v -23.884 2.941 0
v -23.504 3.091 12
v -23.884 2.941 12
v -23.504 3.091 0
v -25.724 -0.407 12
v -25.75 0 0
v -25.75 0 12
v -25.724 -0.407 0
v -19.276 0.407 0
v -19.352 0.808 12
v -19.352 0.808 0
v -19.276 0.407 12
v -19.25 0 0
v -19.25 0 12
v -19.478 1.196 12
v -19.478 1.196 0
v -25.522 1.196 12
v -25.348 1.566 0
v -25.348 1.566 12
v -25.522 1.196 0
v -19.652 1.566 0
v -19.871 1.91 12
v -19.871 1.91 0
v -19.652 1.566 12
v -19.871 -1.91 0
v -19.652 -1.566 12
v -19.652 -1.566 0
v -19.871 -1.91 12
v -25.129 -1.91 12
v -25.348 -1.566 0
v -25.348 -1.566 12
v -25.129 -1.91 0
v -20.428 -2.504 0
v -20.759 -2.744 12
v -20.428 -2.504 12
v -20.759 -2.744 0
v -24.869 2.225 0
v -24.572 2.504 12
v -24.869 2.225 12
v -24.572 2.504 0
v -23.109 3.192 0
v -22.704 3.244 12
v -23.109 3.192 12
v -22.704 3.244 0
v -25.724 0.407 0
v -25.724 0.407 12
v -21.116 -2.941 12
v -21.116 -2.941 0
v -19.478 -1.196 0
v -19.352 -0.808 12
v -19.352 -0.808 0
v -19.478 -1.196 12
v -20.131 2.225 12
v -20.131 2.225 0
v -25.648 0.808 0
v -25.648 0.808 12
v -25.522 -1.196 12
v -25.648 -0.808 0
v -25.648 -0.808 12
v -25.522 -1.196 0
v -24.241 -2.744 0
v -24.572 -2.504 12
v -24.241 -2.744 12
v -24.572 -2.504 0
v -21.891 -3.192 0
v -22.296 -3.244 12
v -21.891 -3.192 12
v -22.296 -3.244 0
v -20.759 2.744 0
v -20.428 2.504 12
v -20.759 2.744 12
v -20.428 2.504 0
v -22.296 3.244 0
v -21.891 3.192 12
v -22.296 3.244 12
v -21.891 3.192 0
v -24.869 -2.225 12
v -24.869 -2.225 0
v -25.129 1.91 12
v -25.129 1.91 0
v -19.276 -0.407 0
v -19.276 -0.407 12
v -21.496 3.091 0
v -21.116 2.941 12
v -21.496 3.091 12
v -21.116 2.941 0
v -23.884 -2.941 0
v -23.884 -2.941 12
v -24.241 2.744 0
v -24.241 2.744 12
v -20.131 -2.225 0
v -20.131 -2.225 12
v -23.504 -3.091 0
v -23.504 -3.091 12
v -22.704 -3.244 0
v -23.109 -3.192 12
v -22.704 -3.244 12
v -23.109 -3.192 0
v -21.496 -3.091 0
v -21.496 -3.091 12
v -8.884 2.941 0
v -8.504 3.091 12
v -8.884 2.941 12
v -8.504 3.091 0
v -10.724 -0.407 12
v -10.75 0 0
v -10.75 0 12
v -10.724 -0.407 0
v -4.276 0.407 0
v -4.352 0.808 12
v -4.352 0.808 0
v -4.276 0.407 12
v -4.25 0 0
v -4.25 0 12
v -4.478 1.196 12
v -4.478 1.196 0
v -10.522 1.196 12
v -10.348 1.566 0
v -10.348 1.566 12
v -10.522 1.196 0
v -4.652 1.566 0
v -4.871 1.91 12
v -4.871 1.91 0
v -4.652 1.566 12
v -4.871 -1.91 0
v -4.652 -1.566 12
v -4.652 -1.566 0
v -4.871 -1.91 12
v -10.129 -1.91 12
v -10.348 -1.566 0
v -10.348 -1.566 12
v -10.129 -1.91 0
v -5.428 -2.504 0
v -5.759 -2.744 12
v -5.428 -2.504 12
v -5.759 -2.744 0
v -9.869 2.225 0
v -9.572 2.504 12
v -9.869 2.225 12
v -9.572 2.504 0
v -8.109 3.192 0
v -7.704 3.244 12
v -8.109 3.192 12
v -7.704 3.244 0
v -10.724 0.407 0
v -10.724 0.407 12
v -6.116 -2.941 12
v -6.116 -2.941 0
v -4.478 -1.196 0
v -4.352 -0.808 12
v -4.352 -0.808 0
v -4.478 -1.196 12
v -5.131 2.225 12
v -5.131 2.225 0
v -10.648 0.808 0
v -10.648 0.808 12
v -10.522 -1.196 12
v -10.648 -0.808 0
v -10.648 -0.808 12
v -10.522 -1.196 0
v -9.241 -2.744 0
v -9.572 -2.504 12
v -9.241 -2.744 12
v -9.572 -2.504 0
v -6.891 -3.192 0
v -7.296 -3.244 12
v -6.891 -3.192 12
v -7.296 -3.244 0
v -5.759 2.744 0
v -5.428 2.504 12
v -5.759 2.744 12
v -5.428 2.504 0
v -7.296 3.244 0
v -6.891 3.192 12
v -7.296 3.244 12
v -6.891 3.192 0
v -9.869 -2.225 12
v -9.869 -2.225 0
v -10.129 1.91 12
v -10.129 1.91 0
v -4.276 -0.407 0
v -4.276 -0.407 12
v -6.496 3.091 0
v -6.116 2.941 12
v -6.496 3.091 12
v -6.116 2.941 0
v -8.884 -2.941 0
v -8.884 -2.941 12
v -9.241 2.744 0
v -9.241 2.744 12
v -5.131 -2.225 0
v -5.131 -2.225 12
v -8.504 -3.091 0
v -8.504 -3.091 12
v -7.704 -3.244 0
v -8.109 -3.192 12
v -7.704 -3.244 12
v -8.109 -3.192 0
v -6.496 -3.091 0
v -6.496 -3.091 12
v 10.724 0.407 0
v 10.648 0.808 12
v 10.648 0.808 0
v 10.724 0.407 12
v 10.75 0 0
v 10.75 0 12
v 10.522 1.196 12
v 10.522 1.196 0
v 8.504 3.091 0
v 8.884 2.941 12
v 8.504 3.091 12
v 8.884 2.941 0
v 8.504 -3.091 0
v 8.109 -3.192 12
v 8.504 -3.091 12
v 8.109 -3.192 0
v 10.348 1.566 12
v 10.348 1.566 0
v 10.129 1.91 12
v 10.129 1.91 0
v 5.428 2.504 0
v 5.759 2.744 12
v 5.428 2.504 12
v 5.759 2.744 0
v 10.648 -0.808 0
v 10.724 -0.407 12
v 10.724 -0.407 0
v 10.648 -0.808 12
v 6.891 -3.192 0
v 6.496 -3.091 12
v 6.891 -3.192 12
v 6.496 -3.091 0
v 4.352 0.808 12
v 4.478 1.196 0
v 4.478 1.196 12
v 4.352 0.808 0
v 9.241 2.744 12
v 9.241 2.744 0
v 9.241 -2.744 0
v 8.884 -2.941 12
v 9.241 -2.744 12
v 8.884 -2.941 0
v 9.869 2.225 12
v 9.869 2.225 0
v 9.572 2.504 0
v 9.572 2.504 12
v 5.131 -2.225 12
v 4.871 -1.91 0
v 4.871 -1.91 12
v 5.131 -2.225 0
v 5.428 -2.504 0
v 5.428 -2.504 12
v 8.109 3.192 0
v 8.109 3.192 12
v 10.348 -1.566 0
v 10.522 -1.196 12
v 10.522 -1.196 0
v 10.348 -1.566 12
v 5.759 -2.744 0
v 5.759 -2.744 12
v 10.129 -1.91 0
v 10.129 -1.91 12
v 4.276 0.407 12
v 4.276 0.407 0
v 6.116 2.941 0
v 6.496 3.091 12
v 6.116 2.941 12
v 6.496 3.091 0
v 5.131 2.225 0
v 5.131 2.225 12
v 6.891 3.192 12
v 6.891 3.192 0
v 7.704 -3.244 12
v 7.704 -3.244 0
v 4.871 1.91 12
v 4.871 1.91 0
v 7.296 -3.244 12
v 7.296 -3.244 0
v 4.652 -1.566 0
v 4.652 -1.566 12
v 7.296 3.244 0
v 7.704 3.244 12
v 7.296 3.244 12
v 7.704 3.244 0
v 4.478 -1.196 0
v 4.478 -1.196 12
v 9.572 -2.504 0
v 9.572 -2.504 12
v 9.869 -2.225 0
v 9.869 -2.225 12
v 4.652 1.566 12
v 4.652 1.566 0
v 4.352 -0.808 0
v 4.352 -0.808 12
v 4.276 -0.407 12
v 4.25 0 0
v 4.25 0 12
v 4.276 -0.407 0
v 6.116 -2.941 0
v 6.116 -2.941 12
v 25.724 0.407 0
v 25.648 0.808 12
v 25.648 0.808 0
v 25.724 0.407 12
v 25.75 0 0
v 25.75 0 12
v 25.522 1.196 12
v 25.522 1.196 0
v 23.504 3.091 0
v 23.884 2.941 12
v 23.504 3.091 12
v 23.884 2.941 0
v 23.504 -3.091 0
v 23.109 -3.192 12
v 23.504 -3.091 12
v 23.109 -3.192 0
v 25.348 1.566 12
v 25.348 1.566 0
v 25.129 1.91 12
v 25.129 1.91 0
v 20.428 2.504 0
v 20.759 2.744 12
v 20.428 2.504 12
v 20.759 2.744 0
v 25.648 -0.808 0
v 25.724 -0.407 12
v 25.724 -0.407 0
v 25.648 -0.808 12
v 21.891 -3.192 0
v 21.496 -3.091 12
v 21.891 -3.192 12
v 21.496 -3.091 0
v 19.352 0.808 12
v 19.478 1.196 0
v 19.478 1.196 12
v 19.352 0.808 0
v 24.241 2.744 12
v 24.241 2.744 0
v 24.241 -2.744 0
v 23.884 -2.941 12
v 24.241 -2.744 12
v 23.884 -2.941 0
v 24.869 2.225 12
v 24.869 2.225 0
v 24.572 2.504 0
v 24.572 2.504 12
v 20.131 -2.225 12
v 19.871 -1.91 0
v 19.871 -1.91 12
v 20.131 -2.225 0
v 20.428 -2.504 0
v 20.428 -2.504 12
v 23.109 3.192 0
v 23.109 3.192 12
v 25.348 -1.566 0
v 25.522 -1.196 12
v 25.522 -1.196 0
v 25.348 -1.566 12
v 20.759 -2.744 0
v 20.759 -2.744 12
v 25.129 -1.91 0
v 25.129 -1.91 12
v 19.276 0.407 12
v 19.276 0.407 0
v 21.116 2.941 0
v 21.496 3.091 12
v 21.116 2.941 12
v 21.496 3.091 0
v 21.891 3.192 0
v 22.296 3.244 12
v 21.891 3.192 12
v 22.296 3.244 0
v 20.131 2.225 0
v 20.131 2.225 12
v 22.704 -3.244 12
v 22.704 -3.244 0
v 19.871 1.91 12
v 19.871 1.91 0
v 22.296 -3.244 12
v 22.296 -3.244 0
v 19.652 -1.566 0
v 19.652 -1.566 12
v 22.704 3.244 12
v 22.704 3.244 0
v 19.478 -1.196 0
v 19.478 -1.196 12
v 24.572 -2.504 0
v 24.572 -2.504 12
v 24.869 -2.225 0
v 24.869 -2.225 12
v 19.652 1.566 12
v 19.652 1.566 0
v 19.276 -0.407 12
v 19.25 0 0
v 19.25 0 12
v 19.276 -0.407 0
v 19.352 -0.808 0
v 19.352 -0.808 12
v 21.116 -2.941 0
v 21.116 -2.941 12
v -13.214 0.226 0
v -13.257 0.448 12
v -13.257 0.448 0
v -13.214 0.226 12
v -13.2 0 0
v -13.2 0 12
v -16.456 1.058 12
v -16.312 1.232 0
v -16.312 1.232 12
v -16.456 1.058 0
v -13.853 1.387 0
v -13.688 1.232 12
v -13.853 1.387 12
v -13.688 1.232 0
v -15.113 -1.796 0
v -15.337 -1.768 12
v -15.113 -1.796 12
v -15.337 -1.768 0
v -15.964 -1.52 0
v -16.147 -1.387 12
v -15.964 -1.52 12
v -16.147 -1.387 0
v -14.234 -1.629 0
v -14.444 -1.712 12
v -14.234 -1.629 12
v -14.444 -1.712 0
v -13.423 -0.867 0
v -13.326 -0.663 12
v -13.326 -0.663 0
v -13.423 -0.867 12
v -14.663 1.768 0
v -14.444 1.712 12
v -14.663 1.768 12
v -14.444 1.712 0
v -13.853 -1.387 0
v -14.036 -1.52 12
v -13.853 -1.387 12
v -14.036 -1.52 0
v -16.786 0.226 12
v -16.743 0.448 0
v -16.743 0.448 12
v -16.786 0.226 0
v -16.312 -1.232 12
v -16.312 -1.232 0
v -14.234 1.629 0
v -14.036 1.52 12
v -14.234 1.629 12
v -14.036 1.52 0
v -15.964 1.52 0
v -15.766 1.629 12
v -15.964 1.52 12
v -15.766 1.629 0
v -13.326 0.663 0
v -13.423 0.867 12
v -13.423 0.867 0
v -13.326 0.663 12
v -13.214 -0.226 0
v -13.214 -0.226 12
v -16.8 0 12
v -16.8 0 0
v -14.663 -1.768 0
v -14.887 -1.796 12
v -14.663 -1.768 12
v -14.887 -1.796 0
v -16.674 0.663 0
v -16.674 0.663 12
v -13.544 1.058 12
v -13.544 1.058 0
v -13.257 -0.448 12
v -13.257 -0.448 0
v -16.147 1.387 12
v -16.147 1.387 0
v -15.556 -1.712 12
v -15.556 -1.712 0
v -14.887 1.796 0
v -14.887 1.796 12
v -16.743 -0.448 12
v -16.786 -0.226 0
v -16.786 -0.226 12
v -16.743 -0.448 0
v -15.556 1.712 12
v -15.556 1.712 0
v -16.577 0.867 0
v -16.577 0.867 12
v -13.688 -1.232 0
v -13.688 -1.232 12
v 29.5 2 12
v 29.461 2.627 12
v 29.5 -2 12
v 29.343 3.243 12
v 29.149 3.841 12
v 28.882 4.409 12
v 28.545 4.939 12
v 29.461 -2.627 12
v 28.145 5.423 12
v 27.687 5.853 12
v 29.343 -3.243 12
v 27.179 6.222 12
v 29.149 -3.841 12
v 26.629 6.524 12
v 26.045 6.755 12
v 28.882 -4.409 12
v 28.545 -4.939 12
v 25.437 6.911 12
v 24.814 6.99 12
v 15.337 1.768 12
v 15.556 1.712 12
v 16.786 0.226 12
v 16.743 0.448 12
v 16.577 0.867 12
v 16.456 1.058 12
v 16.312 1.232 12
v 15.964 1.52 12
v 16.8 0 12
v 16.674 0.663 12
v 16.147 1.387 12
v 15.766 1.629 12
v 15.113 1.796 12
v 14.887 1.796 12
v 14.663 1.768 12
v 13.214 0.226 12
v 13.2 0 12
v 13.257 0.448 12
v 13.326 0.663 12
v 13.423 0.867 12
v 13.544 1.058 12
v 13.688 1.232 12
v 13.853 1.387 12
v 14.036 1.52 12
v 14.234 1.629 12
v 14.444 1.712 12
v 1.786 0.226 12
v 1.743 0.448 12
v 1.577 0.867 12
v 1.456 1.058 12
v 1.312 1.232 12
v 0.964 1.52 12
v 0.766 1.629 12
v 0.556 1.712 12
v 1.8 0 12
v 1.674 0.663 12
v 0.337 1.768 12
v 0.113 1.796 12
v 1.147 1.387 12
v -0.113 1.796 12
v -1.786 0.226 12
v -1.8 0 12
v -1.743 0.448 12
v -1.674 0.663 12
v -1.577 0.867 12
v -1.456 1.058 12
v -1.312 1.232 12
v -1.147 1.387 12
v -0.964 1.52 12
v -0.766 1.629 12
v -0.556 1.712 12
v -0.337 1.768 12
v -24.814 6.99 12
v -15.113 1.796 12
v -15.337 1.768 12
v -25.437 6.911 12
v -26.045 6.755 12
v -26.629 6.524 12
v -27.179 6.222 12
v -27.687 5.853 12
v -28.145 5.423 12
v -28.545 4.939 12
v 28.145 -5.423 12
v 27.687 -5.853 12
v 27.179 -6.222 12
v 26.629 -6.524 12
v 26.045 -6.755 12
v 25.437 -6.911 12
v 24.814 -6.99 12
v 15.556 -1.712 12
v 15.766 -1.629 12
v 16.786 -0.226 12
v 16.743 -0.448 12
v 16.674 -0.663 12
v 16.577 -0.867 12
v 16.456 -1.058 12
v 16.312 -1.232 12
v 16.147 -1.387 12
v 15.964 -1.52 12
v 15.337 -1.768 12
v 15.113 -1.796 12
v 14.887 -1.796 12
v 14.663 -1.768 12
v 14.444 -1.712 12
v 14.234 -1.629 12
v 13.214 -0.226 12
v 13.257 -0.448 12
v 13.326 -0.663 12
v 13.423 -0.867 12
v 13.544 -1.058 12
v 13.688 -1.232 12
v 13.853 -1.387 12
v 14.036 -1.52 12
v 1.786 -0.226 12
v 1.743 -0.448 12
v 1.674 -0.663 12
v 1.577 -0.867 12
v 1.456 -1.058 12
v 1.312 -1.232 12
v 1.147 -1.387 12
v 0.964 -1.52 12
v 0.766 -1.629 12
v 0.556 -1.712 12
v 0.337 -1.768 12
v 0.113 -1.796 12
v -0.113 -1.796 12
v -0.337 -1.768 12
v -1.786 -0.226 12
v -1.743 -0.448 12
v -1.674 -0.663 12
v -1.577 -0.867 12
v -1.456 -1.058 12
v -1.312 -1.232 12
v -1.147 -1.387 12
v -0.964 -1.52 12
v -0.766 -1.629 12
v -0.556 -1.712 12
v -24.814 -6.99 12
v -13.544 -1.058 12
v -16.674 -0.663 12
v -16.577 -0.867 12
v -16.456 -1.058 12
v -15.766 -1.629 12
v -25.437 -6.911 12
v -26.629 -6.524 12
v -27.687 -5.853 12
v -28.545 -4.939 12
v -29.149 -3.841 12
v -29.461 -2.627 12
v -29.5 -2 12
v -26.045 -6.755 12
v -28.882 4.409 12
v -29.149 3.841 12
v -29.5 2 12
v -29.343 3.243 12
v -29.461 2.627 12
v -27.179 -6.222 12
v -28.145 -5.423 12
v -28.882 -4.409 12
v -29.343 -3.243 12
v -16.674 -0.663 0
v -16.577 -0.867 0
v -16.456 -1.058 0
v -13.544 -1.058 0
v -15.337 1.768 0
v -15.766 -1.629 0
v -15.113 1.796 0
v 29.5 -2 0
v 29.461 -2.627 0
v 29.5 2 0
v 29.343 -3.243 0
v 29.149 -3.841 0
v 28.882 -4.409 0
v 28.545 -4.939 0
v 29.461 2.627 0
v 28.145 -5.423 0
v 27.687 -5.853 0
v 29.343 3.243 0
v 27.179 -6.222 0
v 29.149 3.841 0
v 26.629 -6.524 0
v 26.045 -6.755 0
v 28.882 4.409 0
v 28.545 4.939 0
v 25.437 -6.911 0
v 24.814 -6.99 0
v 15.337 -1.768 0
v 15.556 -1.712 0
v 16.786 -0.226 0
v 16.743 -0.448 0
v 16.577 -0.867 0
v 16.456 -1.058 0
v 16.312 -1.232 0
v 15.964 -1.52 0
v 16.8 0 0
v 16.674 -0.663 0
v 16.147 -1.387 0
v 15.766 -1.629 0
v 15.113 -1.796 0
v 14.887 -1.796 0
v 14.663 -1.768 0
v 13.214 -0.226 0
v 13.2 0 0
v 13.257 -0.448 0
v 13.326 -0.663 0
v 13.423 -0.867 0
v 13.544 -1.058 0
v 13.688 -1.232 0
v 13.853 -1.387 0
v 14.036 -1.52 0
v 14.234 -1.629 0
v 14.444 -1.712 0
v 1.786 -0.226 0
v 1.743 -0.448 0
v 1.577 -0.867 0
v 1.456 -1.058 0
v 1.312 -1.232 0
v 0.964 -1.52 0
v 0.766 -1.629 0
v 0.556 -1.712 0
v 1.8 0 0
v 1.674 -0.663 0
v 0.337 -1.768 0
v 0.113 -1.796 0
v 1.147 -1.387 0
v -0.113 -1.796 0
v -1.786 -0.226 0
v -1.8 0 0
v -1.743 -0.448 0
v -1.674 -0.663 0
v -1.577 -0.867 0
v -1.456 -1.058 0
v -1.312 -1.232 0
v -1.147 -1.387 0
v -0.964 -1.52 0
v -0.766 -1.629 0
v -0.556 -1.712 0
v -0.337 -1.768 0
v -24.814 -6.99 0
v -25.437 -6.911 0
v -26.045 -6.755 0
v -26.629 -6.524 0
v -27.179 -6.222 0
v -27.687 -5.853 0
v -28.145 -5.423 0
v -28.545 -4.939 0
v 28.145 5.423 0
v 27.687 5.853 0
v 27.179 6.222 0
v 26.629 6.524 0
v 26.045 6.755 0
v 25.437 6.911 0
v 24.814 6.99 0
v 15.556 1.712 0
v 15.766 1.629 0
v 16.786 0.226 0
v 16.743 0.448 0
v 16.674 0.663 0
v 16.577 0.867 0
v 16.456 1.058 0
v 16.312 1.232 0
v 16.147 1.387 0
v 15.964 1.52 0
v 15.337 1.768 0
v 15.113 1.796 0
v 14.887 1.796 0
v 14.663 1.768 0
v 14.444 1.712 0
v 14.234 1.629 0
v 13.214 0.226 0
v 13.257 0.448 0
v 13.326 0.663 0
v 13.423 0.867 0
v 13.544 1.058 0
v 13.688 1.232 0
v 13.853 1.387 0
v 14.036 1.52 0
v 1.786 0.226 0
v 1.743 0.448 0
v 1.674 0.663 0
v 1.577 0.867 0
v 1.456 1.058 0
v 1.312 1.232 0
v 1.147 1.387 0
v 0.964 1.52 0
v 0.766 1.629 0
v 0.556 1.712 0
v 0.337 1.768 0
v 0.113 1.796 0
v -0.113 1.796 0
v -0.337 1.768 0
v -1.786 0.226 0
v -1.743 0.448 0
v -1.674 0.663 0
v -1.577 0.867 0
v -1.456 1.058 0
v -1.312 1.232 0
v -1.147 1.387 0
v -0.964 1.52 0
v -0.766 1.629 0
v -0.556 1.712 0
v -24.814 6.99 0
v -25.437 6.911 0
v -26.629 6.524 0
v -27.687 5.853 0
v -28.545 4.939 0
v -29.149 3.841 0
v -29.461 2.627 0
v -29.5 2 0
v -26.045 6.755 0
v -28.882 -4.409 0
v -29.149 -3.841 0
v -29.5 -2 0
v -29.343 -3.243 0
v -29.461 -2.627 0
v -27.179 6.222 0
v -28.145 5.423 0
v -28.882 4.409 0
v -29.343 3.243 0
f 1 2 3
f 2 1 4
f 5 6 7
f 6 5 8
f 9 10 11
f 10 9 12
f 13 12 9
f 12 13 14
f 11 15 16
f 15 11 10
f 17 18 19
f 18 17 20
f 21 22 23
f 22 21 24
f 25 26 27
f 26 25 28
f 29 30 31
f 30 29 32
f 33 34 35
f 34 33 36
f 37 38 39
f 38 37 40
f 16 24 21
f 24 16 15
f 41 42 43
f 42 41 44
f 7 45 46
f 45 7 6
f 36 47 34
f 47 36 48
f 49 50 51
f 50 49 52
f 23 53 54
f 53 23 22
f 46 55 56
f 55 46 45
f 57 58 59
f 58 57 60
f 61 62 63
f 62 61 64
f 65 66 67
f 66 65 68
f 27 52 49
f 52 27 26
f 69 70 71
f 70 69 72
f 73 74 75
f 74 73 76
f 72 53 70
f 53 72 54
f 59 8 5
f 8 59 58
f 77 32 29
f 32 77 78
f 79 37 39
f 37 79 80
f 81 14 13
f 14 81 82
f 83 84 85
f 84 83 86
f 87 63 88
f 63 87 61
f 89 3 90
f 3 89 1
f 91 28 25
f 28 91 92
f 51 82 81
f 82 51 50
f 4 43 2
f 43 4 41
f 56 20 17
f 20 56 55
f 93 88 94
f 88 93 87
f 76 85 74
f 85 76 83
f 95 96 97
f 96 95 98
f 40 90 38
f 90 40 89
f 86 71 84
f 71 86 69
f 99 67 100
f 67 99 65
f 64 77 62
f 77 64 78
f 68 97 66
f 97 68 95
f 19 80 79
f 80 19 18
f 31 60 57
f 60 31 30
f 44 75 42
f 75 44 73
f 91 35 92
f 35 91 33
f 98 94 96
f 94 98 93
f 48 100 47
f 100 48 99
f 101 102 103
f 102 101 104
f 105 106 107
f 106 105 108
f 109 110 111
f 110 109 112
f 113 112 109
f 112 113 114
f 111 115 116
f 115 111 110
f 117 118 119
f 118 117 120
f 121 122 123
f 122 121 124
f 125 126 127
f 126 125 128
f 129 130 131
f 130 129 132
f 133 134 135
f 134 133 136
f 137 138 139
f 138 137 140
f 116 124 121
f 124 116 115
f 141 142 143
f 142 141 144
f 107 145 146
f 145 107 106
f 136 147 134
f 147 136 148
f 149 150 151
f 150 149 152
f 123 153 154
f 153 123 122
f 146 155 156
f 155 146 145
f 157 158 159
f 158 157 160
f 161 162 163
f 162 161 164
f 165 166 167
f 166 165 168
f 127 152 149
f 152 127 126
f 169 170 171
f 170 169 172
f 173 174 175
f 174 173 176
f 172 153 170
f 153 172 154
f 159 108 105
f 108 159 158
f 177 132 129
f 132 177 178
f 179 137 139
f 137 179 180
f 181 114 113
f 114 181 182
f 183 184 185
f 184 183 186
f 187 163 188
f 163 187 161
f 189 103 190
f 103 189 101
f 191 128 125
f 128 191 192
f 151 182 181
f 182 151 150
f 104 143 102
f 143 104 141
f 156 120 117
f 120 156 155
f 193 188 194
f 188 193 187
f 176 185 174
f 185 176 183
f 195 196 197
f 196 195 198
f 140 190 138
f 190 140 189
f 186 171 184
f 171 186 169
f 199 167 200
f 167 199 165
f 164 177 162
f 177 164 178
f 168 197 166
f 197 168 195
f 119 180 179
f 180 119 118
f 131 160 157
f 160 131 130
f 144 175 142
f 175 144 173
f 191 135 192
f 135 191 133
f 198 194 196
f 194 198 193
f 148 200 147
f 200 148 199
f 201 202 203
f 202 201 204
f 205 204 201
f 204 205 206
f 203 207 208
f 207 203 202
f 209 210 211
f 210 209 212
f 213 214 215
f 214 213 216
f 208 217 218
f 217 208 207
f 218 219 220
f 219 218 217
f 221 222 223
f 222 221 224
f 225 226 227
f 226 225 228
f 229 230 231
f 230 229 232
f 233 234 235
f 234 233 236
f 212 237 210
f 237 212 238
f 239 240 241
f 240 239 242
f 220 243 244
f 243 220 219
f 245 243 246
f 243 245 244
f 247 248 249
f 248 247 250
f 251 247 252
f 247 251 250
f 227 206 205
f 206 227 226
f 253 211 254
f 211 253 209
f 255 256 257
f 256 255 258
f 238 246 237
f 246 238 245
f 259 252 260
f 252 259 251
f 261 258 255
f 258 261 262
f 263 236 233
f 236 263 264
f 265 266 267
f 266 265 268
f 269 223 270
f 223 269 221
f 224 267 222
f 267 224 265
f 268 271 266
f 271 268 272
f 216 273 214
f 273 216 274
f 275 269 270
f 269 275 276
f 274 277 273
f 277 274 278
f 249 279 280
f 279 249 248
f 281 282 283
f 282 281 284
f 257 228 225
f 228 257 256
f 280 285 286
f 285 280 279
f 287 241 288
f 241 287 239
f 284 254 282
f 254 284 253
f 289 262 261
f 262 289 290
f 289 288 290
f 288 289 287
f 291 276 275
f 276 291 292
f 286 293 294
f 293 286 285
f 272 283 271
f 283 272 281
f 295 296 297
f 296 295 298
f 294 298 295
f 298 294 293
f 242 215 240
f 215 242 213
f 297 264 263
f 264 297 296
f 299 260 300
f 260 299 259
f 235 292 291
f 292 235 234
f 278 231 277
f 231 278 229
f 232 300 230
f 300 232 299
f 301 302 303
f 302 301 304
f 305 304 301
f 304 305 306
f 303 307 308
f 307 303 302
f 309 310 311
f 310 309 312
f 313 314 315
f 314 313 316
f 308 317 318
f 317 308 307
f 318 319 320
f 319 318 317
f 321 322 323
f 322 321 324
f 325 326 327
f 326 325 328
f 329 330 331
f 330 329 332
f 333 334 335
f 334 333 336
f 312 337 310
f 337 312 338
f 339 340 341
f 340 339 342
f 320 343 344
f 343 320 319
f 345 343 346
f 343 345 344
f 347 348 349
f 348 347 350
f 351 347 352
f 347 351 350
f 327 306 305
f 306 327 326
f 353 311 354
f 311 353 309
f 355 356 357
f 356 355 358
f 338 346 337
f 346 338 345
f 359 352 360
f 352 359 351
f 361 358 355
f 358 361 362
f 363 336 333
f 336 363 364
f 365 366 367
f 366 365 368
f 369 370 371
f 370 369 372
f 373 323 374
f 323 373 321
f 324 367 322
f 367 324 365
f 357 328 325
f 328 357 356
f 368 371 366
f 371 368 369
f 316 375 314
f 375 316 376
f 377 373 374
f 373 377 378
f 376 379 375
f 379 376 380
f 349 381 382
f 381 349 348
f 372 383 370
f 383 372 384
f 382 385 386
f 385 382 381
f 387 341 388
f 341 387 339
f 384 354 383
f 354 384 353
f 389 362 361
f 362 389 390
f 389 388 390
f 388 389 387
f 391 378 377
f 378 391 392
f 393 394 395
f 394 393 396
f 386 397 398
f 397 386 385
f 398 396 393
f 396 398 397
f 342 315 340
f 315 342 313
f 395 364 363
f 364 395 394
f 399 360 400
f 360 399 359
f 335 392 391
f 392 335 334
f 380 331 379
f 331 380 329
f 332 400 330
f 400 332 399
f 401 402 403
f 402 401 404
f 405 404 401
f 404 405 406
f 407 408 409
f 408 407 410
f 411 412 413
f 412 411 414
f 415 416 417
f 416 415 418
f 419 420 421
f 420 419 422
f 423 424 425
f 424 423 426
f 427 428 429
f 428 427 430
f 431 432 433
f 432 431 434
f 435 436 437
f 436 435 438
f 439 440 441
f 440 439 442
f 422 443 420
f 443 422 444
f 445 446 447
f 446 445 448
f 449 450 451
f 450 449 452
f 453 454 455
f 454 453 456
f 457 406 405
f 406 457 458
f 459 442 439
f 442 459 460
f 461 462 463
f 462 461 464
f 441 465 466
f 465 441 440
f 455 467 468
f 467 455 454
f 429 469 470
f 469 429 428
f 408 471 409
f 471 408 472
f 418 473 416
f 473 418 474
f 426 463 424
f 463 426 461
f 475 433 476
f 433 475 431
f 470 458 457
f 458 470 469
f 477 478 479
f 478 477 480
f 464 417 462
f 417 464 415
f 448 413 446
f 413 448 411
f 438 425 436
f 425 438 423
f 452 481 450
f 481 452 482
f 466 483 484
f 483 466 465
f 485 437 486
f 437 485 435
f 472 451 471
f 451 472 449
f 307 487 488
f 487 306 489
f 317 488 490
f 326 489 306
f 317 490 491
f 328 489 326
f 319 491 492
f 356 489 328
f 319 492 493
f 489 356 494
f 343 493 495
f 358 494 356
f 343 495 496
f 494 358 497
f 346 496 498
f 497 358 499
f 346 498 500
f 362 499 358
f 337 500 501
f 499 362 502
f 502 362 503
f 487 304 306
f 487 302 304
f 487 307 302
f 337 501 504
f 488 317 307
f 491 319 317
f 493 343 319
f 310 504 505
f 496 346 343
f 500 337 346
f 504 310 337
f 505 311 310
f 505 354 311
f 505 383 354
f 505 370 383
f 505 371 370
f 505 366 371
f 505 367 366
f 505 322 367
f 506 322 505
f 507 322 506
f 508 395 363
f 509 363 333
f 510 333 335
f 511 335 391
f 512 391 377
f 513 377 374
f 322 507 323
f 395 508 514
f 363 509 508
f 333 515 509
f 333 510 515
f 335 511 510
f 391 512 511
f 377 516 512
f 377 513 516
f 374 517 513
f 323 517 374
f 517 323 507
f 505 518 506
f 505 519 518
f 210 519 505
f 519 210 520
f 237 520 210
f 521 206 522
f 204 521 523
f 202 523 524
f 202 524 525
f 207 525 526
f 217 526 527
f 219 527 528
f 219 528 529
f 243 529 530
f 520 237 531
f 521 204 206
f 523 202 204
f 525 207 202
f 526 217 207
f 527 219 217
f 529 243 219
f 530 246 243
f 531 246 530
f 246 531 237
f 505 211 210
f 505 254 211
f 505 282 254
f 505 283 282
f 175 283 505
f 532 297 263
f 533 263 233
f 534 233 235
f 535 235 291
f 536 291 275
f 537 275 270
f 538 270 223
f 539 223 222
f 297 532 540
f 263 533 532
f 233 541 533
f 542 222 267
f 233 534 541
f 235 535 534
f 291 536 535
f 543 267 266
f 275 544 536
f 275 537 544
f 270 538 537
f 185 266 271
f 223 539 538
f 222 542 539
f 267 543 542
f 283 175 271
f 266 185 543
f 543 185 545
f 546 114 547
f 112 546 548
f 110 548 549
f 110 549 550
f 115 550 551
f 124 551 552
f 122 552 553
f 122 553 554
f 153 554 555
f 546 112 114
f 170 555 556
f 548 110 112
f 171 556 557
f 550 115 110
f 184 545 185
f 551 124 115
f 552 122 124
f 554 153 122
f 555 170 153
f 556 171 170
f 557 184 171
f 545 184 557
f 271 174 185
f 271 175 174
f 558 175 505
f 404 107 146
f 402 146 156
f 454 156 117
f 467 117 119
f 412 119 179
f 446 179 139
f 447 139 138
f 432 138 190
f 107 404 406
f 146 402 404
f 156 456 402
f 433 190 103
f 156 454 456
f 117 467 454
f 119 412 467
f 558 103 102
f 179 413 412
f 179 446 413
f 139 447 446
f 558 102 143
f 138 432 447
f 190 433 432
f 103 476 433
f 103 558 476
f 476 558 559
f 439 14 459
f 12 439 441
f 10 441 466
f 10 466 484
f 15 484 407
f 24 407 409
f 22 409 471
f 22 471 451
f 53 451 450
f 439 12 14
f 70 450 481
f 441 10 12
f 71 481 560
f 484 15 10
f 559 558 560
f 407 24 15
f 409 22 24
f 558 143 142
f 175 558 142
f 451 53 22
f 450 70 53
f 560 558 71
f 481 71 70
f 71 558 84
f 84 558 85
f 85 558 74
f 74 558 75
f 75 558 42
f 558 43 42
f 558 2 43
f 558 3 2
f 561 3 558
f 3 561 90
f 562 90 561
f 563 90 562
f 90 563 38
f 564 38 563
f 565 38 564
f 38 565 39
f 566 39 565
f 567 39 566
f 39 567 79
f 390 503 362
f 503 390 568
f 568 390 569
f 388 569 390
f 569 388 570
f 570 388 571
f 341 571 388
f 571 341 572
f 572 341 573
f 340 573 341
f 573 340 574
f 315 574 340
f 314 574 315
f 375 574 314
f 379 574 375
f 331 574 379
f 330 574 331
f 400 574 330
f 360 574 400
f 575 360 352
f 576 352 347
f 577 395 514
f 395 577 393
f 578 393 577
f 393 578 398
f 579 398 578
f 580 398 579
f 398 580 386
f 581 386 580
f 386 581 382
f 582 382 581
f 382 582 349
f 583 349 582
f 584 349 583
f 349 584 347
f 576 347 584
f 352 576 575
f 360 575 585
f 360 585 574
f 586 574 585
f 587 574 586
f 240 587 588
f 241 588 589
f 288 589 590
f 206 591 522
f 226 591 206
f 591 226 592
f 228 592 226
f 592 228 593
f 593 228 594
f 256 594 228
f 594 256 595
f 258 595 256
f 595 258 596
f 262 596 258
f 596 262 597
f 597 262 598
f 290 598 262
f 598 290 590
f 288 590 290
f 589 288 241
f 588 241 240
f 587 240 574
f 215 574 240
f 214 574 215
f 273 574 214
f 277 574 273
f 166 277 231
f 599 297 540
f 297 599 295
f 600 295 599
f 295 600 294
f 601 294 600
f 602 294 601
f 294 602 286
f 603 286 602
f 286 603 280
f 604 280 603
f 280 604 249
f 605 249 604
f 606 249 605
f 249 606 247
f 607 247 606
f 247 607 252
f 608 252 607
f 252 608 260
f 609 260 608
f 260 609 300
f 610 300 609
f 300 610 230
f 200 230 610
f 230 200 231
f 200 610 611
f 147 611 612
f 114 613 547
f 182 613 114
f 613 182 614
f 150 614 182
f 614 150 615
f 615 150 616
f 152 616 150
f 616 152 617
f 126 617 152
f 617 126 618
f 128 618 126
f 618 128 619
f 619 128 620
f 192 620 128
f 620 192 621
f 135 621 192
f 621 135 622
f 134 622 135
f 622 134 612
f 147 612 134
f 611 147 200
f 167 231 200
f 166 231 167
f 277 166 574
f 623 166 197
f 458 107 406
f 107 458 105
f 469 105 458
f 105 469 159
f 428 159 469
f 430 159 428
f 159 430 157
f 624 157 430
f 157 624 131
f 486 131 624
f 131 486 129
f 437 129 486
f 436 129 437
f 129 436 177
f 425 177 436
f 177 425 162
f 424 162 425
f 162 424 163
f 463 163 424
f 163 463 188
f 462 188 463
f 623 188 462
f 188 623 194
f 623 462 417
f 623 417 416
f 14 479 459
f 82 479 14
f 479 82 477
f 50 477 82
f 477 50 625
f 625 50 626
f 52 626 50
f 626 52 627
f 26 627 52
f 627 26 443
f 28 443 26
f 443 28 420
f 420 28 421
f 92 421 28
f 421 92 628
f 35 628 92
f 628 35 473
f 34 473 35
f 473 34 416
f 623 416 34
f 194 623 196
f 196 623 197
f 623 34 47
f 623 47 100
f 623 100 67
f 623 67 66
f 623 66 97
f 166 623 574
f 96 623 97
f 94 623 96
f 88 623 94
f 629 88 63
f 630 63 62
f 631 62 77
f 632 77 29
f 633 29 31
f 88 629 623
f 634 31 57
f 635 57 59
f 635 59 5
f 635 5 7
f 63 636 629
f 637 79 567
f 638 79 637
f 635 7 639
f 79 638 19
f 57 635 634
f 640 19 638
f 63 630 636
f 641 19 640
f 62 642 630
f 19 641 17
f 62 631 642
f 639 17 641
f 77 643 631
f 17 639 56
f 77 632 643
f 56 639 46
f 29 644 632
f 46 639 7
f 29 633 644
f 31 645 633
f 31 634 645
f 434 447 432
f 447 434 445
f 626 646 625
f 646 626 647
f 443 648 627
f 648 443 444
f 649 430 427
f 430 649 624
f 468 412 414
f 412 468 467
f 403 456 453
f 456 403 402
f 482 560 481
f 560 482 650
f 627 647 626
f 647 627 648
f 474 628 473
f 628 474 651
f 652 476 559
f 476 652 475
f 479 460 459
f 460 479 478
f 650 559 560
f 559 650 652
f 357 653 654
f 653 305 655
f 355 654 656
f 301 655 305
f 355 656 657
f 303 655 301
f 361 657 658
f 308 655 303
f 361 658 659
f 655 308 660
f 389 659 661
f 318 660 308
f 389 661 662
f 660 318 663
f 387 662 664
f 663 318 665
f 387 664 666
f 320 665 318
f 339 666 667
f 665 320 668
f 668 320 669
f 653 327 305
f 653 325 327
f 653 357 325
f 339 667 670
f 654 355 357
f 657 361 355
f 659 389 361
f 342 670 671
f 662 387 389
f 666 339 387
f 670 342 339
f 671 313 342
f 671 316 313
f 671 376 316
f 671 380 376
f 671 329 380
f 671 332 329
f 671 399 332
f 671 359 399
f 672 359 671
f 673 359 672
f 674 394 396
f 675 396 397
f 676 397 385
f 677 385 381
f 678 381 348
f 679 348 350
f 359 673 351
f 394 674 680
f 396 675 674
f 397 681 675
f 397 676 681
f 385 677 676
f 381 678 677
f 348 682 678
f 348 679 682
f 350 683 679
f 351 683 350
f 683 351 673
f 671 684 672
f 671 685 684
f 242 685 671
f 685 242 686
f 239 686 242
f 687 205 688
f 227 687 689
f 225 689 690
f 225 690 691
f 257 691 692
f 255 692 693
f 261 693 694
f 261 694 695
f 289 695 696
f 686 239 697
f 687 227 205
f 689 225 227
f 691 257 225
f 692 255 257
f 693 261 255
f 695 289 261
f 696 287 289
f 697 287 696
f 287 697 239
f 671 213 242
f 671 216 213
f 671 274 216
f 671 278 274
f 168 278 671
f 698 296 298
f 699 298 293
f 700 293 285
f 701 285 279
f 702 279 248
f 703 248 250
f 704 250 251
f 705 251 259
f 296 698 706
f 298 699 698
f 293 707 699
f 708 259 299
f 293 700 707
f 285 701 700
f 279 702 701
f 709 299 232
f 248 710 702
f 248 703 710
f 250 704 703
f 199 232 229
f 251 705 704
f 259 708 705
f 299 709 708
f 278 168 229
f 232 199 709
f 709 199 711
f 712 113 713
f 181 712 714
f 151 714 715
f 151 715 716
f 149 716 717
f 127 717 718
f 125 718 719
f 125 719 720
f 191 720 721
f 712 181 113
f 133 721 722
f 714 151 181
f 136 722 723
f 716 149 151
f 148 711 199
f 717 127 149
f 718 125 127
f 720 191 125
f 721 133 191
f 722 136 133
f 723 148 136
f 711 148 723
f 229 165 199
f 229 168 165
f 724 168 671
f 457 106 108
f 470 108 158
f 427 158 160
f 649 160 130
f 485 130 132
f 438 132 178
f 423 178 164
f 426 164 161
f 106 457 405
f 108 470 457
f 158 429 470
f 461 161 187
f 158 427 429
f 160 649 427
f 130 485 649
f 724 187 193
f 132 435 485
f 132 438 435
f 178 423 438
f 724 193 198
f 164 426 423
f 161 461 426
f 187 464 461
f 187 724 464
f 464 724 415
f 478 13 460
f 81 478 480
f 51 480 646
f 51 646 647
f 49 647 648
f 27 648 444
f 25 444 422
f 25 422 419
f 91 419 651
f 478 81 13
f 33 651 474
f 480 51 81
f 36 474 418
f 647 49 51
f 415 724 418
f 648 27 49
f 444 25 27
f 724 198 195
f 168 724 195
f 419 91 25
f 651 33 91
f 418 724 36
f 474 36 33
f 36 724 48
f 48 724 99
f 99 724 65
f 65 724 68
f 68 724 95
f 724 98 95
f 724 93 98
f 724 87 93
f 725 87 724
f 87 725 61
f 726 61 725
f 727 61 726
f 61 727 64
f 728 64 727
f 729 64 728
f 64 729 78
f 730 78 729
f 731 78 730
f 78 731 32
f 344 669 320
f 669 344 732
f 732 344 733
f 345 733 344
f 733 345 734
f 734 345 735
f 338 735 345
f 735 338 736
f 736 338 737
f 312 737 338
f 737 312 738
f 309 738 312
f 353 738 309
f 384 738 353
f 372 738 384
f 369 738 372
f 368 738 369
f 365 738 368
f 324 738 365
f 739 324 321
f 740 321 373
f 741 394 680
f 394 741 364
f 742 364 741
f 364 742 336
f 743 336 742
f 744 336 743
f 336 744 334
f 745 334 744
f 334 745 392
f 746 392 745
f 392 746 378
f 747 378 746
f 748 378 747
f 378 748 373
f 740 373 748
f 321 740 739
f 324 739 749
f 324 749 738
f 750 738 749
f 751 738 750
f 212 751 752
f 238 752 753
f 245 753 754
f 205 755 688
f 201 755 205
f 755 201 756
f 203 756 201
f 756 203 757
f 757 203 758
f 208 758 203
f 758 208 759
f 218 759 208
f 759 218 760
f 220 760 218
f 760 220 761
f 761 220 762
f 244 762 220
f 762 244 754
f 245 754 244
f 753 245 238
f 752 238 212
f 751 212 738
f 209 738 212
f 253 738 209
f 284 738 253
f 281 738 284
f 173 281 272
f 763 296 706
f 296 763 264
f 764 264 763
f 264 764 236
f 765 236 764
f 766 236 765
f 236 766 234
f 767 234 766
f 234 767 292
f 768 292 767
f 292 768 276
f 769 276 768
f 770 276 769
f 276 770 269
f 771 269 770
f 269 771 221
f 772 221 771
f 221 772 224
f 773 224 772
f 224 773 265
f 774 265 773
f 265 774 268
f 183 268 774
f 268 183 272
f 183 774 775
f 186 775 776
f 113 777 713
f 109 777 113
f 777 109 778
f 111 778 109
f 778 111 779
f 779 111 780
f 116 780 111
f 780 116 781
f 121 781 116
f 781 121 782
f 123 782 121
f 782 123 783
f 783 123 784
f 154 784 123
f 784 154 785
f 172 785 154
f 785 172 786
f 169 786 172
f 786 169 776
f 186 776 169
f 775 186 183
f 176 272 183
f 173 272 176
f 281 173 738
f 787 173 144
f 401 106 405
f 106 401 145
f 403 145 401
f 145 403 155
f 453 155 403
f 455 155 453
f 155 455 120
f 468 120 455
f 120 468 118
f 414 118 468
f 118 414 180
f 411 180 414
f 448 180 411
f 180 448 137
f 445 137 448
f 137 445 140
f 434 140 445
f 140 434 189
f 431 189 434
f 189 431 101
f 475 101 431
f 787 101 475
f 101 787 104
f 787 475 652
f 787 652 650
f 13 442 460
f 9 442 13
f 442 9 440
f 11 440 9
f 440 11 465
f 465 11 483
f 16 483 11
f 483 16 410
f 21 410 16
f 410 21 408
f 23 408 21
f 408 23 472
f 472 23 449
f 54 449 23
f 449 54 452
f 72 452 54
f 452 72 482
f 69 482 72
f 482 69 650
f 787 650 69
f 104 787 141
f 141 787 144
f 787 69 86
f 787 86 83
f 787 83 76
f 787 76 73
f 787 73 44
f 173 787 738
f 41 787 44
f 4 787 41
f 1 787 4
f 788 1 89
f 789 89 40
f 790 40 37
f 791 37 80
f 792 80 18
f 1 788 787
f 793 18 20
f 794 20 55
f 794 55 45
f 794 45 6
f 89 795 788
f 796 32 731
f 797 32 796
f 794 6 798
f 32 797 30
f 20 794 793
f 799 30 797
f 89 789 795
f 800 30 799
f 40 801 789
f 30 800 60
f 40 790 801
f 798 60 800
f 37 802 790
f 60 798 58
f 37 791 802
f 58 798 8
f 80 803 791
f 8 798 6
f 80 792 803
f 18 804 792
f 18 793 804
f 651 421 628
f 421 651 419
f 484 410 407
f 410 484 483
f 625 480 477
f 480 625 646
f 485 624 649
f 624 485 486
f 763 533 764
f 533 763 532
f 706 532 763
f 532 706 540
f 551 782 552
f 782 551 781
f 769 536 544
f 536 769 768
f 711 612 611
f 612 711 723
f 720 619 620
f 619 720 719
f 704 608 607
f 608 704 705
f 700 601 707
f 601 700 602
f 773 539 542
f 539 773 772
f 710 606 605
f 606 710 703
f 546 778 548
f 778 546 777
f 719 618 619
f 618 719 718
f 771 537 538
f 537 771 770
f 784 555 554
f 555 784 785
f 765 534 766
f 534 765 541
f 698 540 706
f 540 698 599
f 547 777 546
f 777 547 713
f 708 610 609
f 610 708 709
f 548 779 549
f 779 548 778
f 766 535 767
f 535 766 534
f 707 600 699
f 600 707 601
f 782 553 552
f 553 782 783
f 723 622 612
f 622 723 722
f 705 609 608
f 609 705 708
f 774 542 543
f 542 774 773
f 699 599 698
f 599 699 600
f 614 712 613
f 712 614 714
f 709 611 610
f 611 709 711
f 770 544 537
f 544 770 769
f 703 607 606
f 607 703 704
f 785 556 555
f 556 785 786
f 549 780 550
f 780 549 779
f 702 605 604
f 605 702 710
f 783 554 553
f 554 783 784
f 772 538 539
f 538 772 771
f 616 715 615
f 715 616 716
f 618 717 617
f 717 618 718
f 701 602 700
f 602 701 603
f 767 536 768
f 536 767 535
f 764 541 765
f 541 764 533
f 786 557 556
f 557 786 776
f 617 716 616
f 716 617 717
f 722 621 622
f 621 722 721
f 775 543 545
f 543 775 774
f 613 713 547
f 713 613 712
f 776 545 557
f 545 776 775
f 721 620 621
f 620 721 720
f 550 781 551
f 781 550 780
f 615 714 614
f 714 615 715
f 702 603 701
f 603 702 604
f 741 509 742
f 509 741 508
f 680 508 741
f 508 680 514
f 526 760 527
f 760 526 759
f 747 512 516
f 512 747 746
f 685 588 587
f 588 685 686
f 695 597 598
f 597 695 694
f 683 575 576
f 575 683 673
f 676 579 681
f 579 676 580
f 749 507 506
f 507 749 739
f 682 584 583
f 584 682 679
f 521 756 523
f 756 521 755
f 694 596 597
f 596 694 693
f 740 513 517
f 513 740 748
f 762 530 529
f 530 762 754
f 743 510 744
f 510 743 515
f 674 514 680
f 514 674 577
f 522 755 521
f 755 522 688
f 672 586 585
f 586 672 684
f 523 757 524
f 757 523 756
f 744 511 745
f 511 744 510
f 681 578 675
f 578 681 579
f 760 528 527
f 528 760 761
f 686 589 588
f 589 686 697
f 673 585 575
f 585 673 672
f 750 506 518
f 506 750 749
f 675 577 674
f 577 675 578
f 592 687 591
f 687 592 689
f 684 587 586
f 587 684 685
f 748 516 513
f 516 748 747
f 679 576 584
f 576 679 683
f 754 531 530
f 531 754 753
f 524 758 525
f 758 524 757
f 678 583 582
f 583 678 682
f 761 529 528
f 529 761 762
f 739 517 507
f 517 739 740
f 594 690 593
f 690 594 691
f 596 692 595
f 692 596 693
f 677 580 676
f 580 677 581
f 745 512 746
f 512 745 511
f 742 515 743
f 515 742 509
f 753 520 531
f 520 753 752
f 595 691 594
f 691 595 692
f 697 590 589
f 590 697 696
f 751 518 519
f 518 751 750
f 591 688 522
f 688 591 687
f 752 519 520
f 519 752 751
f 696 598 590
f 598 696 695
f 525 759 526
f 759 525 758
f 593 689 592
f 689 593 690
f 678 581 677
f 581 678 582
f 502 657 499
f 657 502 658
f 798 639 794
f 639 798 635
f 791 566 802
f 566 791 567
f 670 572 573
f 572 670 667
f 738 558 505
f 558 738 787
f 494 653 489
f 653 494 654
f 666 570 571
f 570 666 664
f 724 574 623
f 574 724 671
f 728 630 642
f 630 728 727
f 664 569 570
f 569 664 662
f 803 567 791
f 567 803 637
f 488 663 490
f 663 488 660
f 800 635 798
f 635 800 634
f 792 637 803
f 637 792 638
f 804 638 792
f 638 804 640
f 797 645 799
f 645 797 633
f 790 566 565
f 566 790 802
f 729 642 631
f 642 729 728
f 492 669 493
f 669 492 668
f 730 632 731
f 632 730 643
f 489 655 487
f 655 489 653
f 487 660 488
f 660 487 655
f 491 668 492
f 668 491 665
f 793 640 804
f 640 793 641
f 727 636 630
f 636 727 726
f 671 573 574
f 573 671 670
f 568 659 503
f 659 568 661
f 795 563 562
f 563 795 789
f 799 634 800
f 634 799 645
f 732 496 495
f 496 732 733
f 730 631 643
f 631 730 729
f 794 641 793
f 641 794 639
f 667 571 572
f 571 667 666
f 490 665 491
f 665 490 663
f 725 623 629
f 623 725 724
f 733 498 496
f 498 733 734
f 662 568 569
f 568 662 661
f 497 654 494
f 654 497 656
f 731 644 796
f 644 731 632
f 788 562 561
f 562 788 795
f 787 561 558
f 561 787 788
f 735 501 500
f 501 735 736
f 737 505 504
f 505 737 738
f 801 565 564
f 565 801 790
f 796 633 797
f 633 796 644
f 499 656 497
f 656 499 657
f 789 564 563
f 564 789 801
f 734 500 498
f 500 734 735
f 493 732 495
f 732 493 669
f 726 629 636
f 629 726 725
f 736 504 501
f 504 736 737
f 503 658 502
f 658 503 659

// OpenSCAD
$fn = 50;


difference() {
	union() {
		hull() {
			translate(v = [-24.5000000000, 2.0000000000, 0]) {
				cylinder(h = 12, r = 5);
			}
			translate(v = [24.5000000000, 2.0000000000, 0]) {
				cylinder(h = 12, r = 5);
			}
			translate(v = [-24.5000000000, -2.0000000000, 0]) {
				cylinder(h = 12, r = 5);
			}
			translate(v = [24.5000000000, -2.0000000000, 0]) {
				cylinder(h = 12, r = 5);
			}
		}
	}
	union() {
		translate(v = [-22.5000000000, 0.0000000000, -100.0000000000]) {
			cylinder(h = 200, r = 3.2500000000);
		}
		translate(v = [-7.5000000000, 0.0000000000, -100.0000000000]) {
			cylinder(h = 200, r = 3.2500000000);
		}
		translate(v = [7.5000000000, 0.0000000000, -100.0000000000]) {
			cylinder(h = 200, r = 3.2500000000);
		}
		translate(v = [22.5000000000, 0.0000000000, -100.0000000000]) {
			cylinder(h = 200, r = 3.2500000000);
		}
		translate(v = [-22.5000000000, 0.0000000000, 0]) {
			cylinder(h = 12, r = 1.8000000000);
		}
		translate(v = [-15.0000000000, 0.0000000000, 0]) {
			cylinder(h = 12, r = 1.8000000000);
		}
		translate(v = [-7.5000000000, 0.0000000000, 0]) {
			cylinder(h = 12, r = 1.8000000000);
		}
		cylinder(h = 12, r = 1.8000000000);
		translate(v = [7.5000000000, 0.0000000000, 0]) {
			cylinder(h = 12, r = 1.8000000000);
		}
		translate(v = [15.0000000000, 0.0000000000, 0]) {
			cylinder(h = 12, r = 1.8000000000);
		}
		translate(v = [22.5000000000, 0.0000000000, 0]) {
			cylinder(h = 12, r = 1.8000000000);
		}
		translate(v = [-22.5000000000, 0.0000000000, 0]) {
			cylinder(h = 12, r = 1.8000000000);
		}
		translate(v = [-15.0000000000, 0.0000000000, 0]) {
			cylinder(h = 12, r = 1.8000000000);
		}
		translate(v = [-7.5000000000, 0.0000000000, 0]) {
			cylinder(h = 12, r = 1.8000000000);
		}
		cylinder(h = 12, r = 1.8000000000);
		translate(v = [7.5000000000, 0.0000000000, 0]) {
			cylinder(h = 12, r = 1.8000000000);
		}
		translate(v = [15.0000000000, 0.0000000000, 0]) {
			cylinder(h = 12, r = 1.8000000000);
		}
		translate(v = [22.5000000000, 0.0000000000, 0]) {
			cylinder(h = 12, r = 1.8000000000);
		}
		translate(v = [-22.5000000000, 0.0000000000, 0]) {
			cylinder(h = 12, r = 1.8000000000);
		}
		translate(v = [-15.0000000000, 0.0000000000, 0]) {
			cylinder(h = 12, r = 1.8000000000);
		}
		translate(v = [-7.5000000000, 0.0000000000, 0]) {
			cylinder(h = 12, r = 1.8000000000);
		}
		cylinder(h = 12, r = 1.8000000000);
		translate(v = [7.5000000000, 0.0000000000, 0]) {
			cylinder(h = 12, r = 1.8000000000);
		}
		translate(v = [15.0000000000, 0.0000000000, 0]) {
			cylinder(h = 12, r = 1.8000000000);
		}
		translate(v = [22.5000000000, 0.0000000000, 0]) {
			cylinder(h = 12, r = 1.8000000000);
		}
	}
}
